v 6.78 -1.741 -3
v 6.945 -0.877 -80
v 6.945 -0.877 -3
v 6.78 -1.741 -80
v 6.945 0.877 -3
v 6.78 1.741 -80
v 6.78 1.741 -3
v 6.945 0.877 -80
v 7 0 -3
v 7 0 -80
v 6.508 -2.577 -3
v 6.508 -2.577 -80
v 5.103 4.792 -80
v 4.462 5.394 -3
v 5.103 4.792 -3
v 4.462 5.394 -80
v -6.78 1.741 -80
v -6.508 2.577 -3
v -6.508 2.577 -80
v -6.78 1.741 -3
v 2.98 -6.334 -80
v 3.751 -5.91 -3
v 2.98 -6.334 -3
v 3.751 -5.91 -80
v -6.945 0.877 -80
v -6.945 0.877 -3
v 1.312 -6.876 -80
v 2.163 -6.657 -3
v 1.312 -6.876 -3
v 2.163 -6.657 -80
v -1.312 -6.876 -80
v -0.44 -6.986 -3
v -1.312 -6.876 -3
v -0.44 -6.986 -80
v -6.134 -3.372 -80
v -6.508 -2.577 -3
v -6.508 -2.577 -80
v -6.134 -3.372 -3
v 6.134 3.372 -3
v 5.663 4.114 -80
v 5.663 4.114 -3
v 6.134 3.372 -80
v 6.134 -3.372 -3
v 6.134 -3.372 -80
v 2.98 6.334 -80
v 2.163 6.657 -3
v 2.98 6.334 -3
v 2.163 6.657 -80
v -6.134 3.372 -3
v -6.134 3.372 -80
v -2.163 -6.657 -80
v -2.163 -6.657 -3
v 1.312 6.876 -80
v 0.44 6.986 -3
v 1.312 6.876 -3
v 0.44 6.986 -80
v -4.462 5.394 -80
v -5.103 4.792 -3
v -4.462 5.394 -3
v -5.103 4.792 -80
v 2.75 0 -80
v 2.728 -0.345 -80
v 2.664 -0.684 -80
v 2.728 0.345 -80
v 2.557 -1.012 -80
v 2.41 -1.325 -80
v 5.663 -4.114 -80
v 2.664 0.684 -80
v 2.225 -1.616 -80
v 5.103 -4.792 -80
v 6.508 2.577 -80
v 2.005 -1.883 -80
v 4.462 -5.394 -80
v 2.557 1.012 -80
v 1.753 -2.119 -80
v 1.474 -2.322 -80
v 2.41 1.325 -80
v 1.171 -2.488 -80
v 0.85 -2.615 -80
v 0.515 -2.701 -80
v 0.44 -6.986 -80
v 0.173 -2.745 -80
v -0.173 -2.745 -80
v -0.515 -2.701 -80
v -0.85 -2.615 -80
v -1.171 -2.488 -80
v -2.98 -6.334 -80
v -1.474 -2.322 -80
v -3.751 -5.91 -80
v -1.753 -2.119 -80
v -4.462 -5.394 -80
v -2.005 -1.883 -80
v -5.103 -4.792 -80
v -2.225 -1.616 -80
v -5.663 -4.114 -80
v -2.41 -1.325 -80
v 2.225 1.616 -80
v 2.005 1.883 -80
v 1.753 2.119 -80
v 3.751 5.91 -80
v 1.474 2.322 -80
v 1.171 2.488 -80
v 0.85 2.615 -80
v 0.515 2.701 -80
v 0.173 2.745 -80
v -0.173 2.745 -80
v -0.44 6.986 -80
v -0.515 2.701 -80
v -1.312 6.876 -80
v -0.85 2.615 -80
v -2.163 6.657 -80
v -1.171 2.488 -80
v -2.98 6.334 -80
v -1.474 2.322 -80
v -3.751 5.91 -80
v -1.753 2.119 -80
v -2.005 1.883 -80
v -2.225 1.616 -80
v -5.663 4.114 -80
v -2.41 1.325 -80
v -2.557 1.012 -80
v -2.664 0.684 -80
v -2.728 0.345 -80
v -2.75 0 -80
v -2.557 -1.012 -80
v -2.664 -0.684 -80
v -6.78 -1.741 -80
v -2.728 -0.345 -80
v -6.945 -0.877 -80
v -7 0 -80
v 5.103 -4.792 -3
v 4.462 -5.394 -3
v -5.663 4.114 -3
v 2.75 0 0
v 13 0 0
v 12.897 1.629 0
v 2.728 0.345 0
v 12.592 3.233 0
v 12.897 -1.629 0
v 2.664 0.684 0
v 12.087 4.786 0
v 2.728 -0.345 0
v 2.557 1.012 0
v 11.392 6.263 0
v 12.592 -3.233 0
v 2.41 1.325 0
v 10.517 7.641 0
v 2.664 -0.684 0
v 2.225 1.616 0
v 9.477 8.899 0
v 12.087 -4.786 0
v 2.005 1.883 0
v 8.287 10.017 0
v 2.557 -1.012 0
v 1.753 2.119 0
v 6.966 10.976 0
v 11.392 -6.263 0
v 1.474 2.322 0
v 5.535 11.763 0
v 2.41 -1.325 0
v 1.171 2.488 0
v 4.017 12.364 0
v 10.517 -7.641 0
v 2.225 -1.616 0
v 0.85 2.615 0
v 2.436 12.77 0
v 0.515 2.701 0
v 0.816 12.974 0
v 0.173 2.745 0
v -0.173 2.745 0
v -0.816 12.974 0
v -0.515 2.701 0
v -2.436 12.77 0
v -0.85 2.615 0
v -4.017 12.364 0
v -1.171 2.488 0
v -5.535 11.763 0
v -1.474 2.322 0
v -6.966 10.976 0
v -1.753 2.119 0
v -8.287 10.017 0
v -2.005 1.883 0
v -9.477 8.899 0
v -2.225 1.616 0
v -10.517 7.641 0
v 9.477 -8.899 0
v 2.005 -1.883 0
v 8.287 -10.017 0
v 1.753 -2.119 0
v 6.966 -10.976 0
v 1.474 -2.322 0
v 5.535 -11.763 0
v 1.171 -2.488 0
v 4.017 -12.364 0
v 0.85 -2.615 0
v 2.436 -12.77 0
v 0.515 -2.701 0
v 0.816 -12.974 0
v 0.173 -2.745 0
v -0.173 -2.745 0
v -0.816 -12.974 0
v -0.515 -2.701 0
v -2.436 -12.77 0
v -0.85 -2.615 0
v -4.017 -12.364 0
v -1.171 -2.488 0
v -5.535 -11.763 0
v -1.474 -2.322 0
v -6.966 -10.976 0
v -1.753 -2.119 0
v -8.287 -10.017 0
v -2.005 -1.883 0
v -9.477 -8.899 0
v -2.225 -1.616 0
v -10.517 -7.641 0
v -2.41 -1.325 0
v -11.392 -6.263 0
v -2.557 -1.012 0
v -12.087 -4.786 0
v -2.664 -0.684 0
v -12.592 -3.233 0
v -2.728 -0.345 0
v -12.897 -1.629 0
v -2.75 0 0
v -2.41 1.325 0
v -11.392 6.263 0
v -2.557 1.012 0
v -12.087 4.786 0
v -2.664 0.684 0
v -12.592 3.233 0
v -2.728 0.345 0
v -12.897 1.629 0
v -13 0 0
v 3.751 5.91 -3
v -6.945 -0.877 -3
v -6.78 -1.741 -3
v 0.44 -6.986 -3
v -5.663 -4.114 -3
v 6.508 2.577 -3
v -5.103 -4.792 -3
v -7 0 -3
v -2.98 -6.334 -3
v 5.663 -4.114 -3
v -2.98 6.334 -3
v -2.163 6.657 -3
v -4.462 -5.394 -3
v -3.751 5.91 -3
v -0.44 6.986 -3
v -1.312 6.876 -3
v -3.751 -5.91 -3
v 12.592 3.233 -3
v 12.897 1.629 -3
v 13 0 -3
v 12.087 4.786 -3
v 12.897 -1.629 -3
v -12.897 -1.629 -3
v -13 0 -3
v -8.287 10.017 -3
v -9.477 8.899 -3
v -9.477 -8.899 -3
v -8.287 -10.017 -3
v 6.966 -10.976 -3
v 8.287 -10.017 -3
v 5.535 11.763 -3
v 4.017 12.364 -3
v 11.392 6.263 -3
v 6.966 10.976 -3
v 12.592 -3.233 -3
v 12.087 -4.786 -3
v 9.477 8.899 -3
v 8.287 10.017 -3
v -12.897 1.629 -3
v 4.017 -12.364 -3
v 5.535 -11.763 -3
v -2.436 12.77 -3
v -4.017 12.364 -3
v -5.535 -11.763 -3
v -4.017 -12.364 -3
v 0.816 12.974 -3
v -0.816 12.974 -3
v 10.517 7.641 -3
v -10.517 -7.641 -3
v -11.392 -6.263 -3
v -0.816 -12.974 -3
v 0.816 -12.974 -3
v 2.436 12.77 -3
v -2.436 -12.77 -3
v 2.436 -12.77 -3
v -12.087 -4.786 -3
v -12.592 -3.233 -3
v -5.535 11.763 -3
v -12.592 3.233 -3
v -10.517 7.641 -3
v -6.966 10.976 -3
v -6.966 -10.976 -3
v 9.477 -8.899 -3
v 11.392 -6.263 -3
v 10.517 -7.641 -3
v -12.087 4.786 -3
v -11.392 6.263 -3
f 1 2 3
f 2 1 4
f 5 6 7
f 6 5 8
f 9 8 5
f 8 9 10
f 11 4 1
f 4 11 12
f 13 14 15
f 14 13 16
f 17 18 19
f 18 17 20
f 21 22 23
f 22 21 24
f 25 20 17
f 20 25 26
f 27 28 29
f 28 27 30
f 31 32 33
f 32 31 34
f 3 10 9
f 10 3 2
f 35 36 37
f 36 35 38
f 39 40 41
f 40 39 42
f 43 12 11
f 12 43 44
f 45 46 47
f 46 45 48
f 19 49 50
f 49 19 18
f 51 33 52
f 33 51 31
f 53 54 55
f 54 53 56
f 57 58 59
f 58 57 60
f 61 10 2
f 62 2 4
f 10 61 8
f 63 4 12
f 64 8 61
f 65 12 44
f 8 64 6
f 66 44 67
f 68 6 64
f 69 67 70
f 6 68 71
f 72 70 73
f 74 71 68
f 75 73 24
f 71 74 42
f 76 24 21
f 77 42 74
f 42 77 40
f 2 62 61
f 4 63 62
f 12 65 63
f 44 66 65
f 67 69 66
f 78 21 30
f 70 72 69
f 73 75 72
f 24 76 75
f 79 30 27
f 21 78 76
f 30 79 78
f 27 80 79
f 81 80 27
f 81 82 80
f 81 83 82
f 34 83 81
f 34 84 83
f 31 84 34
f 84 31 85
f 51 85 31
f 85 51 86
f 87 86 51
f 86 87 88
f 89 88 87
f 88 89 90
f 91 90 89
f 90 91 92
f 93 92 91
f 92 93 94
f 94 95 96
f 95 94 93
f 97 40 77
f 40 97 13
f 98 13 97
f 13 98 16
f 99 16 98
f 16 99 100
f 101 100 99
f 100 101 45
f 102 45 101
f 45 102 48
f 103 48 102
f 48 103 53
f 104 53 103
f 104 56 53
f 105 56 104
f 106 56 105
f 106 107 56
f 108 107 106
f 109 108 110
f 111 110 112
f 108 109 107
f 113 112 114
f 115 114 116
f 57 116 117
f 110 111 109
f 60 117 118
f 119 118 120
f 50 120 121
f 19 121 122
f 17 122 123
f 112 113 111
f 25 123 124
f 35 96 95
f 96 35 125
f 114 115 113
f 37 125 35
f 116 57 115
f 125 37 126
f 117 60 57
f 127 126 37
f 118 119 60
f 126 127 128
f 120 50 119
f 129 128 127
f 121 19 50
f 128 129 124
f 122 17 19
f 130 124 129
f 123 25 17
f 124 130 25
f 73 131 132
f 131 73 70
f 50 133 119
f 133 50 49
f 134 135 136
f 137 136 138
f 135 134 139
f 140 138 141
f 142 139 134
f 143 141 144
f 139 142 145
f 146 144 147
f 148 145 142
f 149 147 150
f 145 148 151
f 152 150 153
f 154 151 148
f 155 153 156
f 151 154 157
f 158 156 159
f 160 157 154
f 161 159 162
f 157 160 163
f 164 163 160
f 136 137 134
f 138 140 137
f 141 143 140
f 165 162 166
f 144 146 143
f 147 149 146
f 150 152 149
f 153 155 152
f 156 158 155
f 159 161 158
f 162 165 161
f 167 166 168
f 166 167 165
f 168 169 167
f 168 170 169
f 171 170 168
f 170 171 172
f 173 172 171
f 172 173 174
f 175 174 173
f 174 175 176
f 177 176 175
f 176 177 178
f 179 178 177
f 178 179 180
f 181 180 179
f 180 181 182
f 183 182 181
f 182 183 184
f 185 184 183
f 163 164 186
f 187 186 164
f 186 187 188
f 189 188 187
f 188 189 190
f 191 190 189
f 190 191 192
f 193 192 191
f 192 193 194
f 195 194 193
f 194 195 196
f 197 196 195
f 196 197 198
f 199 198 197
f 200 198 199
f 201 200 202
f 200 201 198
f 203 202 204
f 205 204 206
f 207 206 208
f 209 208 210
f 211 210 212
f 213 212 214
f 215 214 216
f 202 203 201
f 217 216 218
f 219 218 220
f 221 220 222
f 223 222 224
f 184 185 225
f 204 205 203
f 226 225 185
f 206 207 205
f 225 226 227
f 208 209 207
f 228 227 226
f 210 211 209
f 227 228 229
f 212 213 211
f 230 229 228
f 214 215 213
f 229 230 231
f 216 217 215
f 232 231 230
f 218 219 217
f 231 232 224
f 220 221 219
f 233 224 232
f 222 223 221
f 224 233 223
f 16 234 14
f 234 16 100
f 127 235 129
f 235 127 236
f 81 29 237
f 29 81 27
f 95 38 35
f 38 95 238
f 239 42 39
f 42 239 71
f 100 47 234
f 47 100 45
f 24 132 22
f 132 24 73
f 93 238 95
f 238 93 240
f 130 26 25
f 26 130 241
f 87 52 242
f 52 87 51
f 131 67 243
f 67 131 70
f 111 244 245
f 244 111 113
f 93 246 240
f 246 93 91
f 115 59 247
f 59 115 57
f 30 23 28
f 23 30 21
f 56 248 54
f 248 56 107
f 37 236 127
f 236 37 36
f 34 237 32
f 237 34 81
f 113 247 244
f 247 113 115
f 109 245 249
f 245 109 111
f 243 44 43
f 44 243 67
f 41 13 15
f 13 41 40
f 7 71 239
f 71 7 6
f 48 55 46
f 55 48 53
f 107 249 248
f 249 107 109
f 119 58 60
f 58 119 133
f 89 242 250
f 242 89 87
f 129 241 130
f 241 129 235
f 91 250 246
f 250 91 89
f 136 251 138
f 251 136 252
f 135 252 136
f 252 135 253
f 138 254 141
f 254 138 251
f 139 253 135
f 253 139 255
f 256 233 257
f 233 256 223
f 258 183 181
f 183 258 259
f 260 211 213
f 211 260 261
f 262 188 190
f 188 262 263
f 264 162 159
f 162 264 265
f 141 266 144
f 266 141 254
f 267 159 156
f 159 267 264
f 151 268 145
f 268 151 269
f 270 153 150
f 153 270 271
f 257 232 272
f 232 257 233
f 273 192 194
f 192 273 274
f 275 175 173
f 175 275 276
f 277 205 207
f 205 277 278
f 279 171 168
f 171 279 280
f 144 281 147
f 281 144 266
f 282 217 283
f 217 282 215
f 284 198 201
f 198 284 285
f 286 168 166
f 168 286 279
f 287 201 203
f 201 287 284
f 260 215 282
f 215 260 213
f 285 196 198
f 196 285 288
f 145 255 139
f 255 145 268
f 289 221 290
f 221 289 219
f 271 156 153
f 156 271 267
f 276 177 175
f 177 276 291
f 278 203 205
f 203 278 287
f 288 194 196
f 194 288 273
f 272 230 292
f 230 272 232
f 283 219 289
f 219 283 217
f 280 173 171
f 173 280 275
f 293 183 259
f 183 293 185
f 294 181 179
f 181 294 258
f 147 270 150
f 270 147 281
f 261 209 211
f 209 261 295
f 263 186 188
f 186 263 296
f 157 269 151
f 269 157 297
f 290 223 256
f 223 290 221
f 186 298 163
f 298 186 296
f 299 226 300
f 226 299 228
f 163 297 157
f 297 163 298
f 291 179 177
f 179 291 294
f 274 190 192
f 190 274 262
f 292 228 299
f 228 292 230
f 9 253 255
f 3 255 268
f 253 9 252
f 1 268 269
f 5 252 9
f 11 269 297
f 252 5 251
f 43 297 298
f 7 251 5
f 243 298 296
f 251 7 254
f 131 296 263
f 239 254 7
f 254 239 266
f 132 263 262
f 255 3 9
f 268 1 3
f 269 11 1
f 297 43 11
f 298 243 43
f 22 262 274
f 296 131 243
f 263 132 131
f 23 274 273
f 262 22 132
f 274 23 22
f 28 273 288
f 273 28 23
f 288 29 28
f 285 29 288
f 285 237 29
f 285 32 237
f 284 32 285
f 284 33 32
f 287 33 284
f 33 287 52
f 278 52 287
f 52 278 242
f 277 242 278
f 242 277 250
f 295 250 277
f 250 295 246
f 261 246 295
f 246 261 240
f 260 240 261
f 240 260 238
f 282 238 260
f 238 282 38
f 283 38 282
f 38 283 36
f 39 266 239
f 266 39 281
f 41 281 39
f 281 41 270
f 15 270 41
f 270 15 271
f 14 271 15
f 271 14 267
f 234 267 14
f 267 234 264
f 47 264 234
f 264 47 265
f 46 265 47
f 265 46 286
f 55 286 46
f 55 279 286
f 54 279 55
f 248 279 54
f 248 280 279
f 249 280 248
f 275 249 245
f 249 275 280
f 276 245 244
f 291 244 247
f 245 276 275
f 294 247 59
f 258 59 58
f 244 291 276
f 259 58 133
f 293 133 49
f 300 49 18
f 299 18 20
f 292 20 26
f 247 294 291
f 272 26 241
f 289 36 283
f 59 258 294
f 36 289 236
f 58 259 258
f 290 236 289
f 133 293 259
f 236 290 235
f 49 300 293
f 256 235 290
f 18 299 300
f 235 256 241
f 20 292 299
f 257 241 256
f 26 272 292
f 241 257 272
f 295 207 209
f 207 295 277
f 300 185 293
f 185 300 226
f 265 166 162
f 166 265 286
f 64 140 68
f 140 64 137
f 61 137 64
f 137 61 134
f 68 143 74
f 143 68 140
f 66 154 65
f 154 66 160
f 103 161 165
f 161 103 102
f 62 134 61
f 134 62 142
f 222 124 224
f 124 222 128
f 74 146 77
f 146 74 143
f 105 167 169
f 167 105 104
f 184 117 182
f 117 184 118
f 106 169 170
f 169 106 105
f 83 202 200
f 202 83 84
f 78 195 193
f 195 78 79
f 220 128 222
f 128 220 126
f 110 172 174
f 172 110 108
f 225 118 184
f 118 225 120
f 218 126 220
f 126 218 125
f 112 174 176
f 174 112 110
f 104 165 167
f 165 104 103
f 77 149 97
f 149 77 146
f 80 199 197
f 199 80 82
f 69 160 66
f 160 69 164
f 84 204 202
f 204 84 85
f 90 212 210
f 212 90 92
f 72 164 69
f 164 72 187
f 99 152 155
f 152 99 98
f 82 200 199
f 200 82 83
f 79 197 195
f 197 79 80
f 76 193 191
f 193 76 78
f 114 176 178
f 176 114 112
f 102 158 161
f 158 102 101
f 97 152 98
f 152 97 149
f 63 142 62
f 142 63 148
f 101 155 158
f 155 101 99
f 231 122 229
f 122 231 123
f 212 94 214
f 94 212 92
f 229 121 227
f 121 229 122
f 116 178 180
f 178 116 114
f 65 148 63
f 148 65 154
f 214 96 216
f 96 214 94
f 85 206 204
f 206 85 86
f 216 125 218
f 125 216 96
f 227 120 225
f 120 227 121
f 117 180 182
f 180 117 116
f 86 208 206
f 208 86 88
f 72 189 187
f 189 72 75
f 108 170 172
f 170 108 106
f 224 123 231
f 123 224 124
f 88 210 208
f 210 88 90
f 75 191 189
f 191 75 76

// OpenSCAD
$fn = 50;


difference() {
	union() {
		translate(v = [0, 0, -80.0000000000]) {
			cylinder(h = 80, r = 7.0000000000);
		}
		translate(v = [0, 0, -3.0000000000]) {
			cylinder(h = 3, r = 13.0000000000);
		}
	}
	union() {
		#translate(v = [0, 0, -80]) {
			cylinder(h = 80, r = 2.7500000000);
		}
	}
}
